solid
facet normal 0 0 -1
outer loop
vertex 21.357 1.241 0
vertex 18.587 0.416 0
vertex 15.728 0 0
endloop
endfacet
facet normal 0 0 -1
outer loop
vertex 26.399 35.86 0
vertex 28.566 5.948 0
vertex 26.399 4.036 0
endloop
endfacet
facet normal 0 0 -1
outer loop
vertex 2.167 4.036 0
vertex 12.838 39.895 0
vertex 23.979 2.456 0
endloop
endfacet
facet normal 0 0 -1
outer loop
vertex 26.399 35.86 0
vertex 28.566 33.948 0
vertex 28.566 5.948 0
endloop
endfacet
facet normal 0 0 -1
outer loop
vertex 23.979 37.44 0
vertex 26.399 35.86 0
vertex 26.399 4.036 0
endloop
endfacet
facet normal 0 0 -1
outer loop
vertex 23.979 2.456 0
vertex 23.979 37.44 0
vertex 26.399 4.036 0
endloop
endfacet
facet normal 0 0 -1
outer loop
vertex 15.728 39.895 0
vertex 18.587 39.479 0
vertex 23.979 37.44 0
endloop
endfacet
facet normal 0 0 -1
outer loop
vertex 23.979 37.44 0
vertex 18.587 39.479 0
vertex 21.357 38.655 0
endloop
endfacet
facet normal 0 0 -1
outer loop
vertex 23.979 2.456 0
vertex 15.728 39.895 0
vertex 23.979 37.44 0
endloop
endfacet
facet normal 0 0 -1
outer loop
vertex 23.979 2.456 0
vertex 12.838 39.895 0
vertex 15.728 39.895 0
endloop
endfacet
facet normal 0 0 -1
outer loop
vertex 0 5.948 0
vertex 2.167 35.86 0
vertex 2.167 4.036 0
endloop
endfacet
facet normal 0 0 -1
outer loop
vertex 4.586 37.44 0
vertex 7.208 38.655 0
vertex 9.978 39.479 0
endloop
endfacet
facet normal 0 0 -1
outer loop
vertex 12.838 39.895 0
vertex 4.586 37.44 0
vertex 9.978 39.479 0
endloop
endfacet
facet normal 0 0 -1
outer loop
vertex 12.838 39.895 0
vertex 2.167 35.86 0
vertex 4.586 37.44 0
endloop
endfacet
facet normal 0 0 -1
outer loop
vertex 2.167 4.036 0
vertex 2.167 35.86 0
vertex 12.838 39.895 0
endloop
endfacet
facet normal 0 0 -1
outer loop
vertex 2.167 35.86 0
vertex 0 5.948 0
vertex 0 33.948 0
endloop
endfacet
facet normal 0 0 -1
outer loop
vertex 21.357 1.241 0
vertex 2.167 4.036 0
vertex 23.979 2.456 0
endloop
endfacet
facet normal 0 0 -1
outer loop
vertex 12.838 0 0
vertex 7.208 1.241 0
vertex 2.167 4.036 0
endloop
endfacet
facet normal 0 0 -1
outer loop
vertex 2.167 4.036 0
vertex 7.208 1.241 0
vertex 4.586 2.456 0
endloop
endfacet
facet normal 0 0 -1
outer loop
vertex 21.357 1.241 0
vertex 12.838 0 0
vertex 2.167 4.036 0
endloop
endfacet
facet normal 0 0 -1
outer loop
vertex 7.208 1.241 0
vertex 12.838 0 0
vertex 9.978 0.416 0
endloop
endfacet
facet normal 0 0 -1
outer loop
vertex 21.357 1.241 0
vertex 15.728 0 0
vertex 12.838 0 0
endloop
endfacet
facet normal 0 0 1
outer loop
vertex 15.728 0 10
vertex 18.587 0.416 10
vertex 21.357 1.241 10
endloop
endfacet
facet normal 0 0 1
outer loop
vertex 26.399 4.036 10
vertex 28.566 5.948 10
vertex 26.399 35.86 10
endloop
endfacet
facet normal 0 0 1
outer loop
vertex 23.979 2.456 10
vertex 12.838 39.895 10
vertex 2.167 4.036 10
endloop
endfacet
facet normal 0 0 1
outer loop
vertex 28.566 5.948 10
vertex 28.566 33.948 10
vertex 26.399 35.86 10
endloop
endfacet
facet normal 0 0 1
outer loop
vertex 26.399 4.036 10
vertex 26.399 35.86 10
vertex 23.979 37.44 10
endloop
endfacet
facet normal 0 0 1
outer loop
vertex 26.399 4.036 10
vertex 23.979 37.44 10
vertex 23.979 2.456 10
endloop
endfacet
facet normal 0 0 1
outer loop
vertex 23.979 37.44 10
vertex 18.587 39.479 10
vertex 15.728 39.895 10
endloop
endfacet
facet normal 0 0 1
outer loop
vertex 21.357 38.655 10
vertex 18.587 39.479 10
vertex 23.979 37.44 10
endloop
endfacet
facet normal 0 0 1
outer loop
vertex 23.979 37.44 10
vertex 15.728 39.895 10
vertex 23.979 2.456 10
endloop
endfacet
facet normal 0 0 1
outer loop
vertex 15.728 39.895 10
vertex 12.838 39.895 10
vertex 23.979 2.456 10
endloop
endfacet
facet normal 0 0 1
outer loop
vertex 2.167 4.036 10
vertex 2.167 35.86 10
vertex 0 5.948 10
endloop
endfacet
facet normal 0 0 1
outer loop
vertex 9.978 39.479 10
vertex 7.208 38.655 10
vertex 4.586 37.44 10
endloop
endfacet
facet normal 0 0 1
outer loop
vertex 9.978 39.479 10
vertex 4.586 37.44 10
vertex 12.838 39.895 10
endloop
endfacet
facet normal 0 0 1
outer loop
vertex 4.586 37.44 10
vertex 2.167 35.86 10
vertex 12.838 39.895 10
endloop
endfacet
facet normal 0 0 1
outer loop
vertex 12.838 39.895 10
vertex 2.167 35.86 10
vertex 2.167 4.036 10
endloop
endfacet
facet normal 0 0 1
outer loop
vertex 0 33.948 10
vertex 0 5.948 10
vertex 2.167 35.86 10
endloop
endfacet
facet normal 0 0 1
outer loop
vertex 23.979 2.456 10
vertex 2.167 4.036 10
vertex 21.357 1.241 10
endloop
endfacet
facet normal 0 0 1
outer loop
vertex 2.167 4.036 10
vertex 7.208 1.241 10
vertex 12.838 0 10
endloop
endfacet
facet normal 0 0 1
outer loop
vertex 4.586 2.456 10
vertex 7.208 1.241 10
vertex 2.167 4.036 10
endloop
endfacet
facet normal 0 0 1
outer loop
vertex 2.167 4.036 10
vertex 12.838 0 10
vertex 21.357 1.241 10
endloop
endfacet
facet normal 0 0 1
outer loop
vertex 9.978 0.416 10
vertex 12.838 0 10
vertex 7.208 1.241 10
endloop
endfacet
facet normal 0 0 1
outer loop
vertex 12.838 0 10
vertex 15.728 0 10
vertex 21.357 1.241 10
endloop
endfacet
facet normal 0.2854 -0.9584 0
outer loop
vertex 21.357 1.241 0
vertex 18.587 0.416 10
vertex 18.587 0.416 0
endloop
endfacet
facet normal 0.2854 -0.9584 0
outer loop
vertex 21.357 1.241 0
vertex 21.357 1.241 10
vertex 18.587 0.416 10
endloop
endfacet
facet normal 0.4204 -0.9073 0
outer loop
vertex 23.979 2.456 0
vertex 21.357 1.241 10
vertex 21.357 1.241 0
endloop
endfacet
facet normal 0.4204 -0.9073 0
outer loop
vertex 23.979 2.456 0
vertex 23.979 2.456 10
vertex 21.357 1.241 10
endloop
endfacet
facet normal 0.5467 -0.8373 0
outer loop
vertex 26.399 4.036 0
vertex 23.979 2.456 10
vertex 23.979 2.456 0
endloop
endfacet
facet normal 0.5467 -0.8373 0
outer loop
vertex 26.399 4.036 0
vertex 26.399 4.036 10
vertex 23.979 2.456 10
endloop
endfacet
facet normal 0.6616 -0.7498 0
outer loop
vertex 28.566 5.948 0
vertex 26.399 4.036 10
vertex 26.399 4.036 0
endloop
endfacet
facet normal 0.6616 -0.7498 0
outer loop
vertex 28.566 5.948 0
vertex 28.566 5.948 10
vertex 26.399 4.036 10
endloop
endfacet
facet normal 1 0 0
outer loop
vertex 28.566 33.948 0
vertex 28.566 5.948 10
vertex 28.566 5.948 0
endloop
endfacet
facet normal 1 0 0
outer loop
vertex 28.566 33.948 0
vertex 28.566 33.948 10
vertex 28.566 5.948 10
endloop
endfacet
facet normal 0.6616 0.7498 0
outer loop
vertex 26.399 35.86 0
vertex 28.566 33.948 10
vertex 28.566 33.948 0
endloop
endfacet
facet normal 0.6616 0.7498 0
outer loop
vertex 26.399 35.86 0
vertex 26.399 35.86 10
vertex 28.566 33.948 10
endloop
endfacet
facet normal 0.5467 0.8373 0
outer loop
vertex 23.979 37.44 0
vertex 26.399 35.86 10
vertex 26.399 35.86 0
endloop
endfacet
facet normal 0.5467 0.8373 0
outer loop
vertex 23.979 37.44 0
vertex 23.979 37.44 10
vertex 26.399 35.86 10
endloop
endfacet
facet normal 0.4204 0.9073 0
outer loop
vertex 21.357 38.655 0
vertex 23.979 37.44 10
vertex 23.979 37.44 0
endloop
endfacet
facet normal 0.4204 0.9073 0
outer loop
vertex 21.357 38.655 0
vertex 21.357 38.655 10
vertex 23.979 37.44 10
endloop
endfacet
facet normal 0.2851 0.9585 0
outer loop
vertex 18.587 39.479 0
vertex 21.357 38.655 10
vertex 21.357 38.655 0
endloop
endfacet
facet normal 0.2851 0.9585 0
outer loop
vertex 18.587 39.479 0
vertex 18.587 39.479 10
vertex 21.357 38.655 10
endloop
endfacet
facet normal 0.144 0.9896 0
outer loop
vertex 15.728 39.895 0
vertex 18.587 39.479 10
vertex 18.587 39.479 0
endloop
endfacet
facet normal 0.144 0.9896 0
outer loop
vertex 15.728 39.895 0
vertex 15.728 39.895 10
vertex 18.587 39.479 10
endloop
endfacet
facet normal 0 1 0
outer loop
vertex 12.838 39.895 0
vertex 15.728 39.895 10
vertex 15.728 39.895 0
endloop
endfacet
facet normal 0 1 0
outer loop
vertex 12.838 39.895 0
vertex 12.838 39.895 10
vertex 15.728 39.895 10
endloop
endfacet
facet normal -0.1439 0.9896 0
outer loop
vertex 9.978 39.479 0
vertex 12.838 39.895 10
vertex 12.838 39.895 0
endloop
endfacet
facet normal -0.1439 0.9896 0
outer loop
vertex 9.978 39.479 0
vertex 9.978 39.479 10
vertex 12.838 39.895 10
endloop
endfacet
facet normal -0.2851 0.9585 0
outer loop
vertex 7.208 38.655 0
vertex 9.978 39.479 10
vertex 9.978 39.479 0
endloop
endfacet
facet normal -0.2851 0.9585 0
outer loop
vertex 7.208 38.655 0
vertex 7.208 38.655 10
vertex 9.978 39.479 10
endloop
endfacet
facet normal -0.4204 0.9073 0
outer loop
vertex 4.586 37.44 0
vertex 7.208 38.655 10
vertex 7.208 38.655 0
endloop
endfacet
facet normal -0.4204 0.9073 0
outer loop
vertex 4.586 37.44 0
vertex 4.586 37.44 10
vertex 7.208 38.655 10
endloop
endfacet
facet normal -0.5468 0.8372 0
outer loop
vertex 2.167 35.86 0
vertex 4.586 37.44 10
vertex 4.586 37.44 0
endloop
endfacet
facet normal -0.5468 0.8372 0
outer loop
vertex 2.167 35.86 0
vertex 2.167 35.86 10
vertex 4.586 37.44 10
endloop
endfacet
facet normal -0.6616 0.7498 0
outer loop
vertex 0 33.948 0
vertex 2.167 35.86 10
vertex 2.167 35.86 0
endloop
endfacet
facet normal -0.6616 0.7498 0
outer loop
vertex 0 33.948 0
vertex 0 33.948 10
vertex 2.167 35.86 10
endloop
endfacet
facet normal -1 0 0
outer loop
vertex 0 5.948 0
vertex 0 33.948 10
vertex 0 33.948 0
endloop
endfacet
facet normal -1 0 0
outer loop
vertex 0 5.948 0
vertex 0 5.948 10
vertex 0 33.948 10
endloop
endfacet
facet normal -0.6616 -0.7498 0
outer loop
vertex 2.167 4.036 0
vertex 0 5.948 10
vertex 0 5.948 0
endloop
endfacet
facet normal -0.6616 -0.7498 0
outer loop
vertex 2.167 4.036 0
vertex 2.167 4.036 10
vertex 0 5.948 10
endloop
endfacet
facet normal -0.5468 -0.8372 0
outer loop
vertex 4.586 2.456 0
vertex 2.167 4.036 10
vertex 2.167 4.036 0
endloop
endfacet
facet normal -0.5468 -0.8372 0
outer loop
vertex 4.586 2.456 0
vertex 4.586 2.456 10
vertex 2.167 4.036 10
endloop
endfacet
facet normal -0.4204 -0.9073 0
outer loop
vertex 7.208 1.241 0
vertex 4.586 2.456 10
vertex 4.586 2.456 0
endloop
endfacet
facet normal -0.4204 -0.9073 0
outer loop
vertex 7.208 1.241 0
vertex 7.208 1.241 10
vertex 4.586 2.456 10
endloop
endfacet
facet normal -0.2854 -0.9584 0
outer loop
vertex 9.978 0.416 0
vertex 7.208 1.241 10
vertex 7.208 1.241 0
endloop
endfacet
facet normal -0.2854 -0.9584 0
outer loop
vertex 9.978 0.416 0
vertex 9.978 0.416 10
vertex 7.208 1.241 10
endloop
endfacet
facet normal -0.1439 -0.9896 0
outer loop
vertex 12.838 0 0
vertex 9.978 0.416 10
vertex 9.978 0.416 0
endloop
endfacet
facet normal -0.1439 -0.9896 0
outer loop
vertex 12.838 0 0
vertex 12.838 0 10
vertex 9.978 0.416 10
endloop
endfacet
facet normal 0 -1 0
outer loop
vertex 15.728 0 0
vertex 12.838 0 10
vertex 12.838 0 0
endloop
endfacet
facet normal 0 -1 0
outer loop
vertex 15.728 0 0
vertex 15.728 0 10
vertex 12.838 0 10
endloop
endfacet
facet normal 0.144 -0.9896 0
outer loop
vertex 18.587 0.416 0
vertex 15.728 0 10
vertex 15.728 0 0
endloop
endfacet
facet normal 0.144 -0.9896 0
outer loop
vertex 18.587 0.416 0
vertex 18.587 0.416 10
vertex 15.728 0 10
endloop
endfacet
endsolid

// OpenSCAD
$fn = 32;

// ----------------------------------------------------------------------
// Eccentric disc: double_d, 10 mm thick
// ----------------------------------------------------------------------

// --- parameters (mm) ---
profile_height = 10;      // extrusion height
profile_points = 24;      // points of the closed outline

profile = [[28.566, 33.948], [26.399, 35.86], [23.979, 37.44], [21.357, 38.655], [18.587, 39.479], [15.728, 39.895], [12.838, 39.895], [9.978, 39.479], [7.208, 38.655], [4.586, 37.44], [2.167, 35.86], [0, 33.948], [0, 5.948], [2.167, 4.036], [4.586, 2.456], [7.208, 1.241], [9.978, 0.416], [12.838, 0], [15.728, 0], [18.587, 0.416], [21.357, 1.241], [23.979, 2.456], [26.399, 4.036], [28.566, 5.948]];  // single closed polygon, 24 points, counter clockwise

// --- the one profile operation ---
linear_extrude(height = profile_height) polygon(points = profile);
